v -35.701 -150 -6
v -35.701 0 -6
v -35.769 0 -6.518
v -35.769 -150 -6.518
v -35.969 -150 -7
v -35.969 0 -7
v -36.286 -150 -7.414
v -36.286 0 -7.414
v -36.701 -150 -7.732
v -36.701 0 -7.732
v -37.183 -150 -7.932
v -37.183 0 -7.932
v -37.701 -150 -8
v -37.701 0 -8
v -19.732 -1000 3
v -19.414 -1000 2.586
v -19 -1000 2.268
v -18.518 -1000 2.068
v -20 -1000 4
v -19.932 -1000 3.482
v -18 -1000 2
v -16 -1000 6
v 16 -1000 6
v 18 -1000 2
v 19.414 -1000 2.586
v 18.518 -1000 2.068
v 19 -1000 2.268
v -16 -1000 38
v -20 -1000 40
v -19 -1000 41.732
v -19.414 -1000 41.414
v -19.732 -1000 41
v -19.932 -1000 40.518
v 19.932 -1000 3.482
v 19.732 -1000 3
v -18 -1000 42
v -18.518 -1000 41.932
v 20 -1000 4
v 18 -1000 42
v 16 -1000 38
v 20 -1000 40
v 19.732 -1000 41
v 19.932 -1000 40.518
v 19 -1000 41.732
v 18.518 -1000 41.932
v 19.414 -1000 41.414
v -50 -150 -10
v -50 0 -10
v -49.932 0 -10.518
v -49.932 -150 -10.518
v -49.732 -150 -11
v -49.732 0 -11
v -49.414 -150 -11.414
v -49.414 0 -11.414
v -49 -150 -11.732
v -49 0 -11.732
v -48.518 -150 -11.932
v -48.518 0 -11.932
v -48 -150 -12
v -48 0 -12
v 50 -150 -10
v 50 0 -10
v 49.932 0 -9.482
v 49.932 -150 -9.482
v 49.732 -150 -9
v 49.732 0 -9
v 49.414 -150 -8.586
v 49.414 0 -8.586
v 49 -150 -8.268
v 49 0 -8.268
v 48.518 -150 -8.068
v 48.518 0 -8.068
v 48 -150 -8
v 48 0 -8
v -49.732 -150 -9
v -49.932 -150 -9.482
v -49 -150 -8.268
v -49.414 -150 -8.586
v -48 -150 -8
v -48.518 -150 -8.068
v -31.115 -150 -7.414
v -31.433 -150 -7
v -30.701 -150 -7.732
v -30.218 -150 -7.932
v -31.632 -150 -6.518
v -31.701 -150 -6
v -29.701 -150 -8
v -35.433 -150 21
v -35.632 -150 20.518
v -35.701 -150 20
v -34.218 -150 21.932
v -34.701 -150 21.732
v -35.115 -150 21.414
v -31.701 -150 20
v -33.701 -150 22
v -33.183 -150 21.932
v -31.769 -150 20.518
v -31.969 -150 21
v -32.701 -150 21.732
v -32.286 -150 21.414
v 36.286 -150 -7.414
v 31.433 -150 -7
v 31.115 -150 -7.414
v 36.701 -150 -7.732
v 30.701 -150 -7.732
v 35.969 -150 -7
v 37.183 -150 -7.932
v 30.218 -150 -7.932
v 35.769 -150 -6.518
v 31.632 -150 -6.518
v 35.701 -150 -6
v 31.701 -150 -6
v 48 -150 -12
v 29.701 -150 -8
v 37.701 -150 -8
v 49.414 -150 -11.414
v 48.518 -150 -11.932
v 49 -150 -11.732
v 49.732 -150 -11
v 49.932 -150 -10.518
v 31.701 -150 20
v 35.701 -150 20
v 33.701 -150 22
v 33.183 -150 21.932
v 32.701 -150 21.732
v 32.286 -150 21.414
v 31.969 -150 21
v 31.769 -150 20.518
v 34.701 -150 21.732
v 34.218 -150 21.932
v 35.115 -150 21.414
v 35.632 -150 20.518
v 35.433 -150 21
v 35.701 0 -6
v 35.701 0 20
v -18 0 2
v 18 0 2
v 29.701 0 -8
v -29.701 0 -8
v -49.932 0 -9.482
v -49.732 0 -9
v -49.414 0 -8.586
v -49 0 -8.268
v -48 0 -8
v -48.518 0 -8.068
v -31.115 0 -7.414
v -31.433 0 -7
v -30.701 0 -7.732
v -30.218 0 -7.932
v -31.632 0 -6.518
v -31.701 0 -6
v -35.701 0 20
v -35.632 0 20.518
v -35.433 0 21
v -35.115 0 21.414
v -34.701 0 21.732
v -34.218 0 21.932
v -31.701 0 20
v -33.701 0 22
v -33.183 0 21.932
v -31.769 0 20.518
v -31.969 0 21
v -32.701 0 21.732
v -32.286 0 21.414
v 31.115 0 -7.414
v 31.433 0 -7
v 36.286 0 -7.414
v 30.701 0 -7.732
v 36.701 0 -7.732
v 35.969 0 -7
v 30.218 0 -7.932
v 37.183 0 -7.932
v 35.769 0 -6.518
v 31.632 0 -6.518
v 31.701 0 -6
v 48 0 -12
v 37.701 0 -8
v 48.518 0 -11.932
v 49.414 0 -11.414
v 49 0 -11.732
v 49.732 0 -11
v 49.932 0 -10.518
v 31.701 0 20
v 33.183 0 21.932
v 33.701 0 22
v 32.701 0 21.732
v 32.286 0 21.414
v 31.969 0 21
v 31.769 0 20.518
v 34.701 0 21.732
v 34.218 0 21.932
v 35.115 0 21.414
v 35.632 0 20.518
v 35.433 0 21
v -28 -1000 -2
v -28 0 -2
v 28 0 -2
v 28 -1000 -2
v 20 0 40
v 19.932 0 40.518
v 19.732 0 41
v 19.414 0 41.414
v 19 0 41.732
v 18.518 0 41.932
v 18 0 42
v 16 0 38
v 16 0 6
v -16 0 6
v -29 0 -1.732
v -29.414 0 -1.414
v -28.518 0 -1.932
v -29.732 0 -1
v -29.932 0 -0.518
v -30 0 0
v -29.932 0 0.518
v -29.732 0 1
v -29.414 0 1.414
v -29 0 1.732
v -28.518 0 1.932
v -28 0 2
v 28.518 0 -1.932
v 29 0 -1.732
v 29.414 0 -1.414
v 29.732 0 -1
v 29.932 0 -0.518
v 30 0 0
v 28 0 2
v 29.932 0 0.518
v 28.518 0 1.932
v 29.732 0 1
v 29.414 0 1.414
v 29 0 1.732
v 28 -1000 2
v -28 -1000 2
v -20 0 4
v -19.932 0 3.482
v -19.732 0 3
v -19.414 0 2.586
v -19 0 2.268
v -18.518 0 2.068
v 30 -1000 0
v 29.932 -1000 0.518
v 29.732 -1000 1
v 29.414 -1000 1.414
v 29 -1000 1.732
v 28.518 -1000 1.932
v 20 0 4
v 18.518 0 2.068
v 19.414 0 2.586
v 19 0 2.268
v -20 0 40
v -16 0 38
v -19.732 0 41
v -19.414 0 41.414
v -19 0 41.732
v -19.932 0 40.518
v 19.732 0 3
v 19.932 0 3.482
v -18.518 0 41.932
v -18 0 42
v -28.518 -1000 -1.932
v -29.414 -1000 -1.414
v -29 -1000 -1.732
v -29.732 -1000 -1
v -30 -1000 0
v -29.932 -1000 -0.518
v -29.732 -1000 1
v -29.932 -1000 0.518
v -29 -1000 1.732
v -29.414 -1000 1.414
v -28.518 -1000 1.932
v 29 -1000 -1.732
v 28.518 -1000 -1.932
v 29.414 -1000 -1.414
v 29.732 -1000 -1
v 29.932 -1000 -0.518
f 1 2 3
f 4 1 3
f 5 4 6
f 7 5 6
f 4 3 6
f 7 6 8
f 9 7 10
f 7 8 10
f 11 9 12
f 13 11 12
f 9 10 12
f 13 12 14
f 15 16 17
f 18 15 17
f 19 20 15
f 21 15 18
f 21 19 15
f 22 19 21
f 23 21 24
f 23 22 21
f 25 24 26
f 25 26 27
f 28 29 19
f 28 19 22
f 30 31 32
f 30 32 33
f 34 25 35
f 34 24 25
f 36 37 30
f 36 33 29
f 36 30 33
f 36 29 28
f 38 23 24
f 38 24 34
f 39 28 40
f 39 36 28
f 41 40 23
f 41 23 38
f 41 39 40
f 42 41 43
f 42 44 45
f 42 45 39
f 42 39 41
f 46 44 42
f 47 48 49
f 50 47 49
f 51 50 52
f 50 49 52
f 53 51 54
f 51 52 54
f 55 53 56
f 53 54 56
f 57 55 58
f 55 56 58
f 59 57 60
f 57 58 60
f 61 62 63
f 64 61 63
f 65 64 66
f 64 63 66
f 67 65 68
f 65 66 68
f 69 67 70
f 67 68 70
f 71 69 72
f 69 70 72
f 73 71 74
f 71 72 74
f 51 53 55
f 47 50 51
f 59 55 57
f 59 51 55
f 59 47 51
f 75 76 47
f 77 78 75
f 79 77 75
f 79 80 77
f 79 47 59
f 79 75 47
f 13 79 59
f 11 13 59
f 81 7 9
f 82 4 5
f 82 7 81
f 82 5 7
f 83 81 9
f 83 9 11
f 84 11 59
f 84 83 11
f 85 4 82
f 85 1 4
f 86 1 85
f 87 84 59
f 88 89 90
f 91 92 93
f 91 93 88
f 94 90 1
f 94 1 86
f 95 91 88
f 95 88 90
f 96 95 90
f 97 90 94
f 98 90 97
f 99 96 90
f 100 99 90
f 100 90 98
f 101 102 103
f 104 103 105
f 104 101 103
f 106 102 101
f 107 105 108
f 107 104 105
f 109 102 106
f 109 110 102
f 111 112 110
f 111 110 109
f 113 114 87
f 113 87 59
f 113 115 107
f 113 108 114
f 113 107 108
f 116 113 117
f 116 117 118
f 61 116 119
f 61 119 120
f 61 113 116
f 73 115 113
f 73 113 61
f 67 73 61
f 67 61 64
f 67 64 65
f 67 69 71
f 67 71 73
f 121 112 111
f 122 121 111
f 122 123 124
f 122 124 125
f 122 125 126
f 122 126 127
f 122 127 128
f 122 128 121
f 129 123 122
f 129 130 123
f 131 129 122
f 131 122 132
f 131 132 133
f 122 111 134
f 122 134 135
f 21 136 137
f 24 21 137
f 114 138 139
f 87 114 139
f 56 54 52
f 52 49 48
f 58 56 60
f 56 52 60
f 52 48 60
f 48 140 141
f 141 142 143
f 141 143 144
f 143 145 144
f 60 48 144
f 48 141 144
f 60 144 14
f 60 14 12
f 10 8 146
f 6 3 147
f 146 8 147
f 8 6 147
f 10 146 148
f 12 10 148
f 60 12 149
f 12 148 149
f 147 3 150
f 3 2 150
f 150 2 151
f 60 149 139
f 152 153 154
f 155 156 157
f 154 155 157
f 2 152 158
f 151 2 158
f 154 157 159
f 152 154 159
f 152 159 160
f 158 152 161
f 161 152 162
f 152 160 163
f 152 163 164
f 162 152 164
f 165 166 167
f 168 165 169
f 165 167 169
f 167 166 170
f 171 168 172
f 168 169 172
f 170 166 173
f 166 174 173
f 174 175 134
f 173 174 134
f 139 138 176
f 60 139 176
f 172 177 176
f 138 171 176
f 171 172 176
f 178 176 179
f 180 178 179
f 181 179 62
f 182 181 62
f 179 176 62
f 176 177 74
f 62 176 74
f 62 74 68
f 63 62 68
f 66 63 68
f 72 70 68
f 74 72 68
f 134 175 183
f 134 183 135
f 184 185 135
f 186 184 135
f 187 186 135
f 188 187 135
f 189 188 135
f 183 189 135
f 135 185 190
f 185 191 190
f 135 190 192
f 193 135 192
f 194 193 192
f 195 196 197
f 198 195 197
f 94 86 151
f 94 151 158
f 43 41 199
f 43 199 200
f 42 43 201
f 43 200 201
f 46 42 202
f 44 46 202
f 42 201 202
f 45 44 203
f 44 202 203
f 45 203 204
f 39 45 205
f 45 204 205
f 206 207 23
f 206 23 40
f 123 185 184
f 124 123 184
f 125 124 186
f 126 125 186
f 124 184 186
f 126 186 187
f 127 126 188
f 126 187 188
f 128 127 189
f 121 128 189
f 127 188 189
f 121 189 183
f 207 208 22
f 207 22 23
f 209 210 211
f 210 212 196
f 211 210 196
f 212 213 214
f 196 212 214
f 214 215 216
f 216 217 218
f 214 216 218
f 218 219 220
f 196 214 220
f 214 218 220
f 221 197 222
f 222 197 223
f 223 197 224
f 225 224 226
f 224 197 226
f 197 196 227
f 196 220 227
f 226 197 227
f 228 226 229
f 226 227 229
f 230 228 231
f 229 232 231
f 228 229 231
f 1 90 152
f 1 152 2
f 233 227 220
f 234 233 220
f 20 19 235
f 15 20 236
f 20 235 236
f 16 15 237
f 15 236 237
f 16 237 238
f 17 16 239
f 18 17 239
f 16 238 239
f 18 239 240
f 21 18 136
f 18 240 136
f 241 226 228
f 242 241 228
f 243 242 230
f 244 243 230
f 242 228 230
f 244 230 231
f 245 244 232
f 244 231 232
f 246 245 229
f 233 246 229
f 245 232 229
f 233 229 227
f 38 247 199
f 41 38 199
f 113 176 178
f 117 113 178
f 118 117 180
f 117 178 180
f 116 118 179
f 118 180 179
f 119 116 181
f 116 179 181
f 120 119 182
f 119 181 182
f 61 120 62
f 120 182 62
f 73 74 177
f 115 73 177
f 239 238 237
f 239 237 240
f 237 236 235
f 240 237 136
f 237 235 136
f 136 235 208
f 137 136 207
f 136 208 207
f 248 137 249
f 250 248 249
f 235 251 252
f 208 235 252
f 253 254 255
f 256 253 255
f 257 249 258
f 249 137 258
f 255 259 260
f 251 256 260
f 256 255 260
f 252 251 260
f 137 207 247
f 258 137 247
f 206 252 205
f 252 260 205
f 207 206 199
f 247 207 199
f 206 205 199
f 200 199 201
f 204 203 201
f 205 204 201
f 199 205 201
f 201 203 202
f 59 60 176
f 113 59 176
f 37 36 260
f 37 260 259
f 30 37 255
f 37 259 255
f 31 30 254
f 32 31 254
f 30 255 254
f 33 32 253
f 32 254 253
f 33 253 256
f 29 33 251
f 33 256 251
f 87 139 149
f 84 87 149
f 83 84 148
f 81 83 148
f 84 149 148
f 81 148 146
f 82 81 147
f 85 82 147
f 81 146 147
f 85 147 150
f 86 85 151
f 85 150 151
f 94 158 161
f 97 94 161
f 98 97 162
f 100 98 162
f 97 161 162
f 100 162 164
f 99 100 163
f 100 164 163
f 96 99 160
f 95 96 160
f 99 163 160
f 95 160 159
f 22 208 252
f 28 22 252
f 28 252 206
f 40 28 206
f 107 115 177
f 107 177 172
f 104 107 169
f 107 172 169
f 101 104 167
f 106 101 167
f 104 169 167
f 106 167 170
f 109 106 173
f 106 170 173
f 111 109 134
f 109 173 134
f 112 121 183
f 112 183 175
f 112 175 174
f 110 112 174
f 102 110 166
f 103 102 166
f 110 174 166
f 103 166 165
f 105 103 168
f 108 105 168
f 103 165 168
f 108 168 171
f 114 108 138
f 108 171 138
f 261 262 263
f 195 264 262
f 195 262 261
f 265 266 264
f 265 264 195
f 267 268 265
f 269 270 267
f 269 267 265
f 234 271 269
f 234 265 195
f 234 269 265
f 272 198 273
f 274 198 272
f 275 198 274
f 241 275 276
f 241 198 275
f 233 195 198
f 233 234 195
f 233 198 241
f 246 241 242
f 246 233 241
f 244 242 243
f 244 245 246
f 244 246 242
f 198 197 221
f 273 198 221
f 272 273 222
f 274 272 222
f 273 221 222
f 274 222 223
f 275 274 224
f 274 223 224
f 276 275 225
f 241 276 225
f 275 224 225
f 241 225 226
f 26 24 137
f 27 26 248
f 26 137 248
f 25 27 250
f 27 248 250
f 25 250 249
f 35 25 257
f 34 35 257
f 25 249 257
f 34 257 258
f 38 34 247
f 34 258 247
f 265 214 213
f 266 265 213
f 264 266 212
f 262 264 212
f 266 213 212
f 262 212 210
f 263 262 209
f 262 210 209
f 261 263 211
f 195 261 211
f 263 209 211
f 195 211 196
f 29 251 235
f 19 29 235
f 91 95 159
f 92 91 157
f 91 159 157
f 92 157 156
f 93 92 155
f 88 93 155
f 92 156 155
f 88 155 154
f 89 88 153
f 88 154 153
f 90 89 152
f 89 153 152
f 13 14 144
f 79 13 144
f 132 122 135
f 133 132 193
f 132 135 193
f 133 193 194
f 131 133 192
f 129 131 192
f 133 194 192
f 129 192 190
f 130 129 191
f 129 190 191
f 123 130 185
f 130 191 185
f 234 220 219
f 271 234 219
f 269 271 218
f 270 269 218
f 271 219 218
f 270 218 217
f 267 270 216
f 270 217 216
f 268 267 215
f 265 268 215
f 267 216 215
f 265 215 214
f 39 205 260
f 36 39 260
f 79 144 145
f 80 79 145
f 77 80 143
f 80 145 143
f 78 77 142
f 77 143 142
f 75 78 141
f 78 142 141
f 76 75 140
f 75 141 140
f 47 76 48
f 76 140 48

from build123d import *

# Parameters (mm, degrees)
F1_DEPTH = 150
F0_W     = 32
F0_H     = 32
F2_DEPTH = 1000
F3_DEPTH = 1000


with BuildPart() as f1:
    # F0 (on Front) → F1 (new body)
    with BuildSketch(Plane.XZ):
        with BuildLine():
            Line((29.70057, -8), (0, -8))
            Line((0, -8), (-29.70057, -8))
            ThreePointArc((-29.70057, -8), (-31.114784, -7.414214), (-31.70057, -6))
            Line((-31.70057, -6), (-31.70057, 20))
            ThreePointArc((-31.70057, 20), (-32.286357, 21.414214), (-33.70057, 22))
            ThreePointArc((-33.70057, 22), (-35.114784, 21.414214), (-35.70057, 20))
            Line((-35.70057, 20), (-35.70057, -6))
            ThreePointArc((-35.70057, -6), (-36.286357, -7.414214), (-37.70057, -8))
            Line((-37.70057, -8), (-48, -8))
            ThreePointArc((-48, -8), (-49.414214, -8.585786), (-50, -10))
            ThreePointArc((-50, -10), (-49.414214, -11.414214), (-48, -12))
            Line((-48, -12), (0, -12))
            Line((0, -12), (48, -12))
            ThreePointArc((48, -12), (49.414214, -11.414214), (50, -10))
            ThreePointArc((50, -10), (49.414214, -8.585786), (48, -8))
            Line((48, -8), (37.70057, -8))
            ThreePointArc((37.70057, -8), (36.286357, -7.414214), (35.70057, -6))
            Line((35.70057, -6), (35.70057, 20))
            ThreePointArc((35.70057, 20), (35.114784, 21.414214), (33.70057, 22))
            ThreePointArc((33.70057, 22), (32.286357, 21.414214), (31.70057, 20))
            Line((31.70057, 20), (31.70057, -6))
            ThreePointArc((31.70057, -6), (31.114784, -7.414214), (29.70057, -8))
        make_face()
    extrude(amount=F1_DEPTH)


with BuildPart() as f2:
    # F0 (on Front) → F2 (new body)
    with BuildSketch(Plane.XZ):
        with BuildLine():
            ThreePointArc((-20, 4), (-19.414214, 2.585786), (-18, 2))
            Line((-18, 2), (18, 2))
            ThreePointArc((18, 2), (19.414214, 2.585786), (20, 4))
            Line((20, 4), (20, 40))
            ThreePointArc((20, 40), (19.414214, 41.414214), (18, 42))
            Line((18, 42), (-18, 42))
            ThreePointArc((-18, 42), (-19.414214, 41.414214), (-20, 40))
            Line((-20, 40), (-20, 4))
        make_face()
        with Locations((0, 22)):
            Rectangle(F0_W, F0_H, mode=Mode.SUBTRACT)
    extrude(amount=F2_DEPTH)


with BuildPart() as f3:
    # F0 (on Front) → F3 (new body)
    with BuildSketch(Plane.XZ):
        with BuildLine():
            Line((-18, 2), (-28, 2))
            ThreePointArc((-28, 2), (-29.414214, 1.414214), (-30, 0))
            ThreePointArc((-30, 0), (-29.414214, -1.414214), (-28, -2))
            Line((-28, -2), (28, -2))
            ThreePointArc((28, -2), (29.414214, -1.414214), (30, 0))
            ThreePointArc((30, 0), (29.414214, 1.414214), (28, 2))
            Line((28, 2), (18, 2))
            Line((18, 2), (-18, 2))
        make_face()
    extrude(amount=F3_DEPTH)


solid = Compound([f1.part, f2.part, f3.part])
